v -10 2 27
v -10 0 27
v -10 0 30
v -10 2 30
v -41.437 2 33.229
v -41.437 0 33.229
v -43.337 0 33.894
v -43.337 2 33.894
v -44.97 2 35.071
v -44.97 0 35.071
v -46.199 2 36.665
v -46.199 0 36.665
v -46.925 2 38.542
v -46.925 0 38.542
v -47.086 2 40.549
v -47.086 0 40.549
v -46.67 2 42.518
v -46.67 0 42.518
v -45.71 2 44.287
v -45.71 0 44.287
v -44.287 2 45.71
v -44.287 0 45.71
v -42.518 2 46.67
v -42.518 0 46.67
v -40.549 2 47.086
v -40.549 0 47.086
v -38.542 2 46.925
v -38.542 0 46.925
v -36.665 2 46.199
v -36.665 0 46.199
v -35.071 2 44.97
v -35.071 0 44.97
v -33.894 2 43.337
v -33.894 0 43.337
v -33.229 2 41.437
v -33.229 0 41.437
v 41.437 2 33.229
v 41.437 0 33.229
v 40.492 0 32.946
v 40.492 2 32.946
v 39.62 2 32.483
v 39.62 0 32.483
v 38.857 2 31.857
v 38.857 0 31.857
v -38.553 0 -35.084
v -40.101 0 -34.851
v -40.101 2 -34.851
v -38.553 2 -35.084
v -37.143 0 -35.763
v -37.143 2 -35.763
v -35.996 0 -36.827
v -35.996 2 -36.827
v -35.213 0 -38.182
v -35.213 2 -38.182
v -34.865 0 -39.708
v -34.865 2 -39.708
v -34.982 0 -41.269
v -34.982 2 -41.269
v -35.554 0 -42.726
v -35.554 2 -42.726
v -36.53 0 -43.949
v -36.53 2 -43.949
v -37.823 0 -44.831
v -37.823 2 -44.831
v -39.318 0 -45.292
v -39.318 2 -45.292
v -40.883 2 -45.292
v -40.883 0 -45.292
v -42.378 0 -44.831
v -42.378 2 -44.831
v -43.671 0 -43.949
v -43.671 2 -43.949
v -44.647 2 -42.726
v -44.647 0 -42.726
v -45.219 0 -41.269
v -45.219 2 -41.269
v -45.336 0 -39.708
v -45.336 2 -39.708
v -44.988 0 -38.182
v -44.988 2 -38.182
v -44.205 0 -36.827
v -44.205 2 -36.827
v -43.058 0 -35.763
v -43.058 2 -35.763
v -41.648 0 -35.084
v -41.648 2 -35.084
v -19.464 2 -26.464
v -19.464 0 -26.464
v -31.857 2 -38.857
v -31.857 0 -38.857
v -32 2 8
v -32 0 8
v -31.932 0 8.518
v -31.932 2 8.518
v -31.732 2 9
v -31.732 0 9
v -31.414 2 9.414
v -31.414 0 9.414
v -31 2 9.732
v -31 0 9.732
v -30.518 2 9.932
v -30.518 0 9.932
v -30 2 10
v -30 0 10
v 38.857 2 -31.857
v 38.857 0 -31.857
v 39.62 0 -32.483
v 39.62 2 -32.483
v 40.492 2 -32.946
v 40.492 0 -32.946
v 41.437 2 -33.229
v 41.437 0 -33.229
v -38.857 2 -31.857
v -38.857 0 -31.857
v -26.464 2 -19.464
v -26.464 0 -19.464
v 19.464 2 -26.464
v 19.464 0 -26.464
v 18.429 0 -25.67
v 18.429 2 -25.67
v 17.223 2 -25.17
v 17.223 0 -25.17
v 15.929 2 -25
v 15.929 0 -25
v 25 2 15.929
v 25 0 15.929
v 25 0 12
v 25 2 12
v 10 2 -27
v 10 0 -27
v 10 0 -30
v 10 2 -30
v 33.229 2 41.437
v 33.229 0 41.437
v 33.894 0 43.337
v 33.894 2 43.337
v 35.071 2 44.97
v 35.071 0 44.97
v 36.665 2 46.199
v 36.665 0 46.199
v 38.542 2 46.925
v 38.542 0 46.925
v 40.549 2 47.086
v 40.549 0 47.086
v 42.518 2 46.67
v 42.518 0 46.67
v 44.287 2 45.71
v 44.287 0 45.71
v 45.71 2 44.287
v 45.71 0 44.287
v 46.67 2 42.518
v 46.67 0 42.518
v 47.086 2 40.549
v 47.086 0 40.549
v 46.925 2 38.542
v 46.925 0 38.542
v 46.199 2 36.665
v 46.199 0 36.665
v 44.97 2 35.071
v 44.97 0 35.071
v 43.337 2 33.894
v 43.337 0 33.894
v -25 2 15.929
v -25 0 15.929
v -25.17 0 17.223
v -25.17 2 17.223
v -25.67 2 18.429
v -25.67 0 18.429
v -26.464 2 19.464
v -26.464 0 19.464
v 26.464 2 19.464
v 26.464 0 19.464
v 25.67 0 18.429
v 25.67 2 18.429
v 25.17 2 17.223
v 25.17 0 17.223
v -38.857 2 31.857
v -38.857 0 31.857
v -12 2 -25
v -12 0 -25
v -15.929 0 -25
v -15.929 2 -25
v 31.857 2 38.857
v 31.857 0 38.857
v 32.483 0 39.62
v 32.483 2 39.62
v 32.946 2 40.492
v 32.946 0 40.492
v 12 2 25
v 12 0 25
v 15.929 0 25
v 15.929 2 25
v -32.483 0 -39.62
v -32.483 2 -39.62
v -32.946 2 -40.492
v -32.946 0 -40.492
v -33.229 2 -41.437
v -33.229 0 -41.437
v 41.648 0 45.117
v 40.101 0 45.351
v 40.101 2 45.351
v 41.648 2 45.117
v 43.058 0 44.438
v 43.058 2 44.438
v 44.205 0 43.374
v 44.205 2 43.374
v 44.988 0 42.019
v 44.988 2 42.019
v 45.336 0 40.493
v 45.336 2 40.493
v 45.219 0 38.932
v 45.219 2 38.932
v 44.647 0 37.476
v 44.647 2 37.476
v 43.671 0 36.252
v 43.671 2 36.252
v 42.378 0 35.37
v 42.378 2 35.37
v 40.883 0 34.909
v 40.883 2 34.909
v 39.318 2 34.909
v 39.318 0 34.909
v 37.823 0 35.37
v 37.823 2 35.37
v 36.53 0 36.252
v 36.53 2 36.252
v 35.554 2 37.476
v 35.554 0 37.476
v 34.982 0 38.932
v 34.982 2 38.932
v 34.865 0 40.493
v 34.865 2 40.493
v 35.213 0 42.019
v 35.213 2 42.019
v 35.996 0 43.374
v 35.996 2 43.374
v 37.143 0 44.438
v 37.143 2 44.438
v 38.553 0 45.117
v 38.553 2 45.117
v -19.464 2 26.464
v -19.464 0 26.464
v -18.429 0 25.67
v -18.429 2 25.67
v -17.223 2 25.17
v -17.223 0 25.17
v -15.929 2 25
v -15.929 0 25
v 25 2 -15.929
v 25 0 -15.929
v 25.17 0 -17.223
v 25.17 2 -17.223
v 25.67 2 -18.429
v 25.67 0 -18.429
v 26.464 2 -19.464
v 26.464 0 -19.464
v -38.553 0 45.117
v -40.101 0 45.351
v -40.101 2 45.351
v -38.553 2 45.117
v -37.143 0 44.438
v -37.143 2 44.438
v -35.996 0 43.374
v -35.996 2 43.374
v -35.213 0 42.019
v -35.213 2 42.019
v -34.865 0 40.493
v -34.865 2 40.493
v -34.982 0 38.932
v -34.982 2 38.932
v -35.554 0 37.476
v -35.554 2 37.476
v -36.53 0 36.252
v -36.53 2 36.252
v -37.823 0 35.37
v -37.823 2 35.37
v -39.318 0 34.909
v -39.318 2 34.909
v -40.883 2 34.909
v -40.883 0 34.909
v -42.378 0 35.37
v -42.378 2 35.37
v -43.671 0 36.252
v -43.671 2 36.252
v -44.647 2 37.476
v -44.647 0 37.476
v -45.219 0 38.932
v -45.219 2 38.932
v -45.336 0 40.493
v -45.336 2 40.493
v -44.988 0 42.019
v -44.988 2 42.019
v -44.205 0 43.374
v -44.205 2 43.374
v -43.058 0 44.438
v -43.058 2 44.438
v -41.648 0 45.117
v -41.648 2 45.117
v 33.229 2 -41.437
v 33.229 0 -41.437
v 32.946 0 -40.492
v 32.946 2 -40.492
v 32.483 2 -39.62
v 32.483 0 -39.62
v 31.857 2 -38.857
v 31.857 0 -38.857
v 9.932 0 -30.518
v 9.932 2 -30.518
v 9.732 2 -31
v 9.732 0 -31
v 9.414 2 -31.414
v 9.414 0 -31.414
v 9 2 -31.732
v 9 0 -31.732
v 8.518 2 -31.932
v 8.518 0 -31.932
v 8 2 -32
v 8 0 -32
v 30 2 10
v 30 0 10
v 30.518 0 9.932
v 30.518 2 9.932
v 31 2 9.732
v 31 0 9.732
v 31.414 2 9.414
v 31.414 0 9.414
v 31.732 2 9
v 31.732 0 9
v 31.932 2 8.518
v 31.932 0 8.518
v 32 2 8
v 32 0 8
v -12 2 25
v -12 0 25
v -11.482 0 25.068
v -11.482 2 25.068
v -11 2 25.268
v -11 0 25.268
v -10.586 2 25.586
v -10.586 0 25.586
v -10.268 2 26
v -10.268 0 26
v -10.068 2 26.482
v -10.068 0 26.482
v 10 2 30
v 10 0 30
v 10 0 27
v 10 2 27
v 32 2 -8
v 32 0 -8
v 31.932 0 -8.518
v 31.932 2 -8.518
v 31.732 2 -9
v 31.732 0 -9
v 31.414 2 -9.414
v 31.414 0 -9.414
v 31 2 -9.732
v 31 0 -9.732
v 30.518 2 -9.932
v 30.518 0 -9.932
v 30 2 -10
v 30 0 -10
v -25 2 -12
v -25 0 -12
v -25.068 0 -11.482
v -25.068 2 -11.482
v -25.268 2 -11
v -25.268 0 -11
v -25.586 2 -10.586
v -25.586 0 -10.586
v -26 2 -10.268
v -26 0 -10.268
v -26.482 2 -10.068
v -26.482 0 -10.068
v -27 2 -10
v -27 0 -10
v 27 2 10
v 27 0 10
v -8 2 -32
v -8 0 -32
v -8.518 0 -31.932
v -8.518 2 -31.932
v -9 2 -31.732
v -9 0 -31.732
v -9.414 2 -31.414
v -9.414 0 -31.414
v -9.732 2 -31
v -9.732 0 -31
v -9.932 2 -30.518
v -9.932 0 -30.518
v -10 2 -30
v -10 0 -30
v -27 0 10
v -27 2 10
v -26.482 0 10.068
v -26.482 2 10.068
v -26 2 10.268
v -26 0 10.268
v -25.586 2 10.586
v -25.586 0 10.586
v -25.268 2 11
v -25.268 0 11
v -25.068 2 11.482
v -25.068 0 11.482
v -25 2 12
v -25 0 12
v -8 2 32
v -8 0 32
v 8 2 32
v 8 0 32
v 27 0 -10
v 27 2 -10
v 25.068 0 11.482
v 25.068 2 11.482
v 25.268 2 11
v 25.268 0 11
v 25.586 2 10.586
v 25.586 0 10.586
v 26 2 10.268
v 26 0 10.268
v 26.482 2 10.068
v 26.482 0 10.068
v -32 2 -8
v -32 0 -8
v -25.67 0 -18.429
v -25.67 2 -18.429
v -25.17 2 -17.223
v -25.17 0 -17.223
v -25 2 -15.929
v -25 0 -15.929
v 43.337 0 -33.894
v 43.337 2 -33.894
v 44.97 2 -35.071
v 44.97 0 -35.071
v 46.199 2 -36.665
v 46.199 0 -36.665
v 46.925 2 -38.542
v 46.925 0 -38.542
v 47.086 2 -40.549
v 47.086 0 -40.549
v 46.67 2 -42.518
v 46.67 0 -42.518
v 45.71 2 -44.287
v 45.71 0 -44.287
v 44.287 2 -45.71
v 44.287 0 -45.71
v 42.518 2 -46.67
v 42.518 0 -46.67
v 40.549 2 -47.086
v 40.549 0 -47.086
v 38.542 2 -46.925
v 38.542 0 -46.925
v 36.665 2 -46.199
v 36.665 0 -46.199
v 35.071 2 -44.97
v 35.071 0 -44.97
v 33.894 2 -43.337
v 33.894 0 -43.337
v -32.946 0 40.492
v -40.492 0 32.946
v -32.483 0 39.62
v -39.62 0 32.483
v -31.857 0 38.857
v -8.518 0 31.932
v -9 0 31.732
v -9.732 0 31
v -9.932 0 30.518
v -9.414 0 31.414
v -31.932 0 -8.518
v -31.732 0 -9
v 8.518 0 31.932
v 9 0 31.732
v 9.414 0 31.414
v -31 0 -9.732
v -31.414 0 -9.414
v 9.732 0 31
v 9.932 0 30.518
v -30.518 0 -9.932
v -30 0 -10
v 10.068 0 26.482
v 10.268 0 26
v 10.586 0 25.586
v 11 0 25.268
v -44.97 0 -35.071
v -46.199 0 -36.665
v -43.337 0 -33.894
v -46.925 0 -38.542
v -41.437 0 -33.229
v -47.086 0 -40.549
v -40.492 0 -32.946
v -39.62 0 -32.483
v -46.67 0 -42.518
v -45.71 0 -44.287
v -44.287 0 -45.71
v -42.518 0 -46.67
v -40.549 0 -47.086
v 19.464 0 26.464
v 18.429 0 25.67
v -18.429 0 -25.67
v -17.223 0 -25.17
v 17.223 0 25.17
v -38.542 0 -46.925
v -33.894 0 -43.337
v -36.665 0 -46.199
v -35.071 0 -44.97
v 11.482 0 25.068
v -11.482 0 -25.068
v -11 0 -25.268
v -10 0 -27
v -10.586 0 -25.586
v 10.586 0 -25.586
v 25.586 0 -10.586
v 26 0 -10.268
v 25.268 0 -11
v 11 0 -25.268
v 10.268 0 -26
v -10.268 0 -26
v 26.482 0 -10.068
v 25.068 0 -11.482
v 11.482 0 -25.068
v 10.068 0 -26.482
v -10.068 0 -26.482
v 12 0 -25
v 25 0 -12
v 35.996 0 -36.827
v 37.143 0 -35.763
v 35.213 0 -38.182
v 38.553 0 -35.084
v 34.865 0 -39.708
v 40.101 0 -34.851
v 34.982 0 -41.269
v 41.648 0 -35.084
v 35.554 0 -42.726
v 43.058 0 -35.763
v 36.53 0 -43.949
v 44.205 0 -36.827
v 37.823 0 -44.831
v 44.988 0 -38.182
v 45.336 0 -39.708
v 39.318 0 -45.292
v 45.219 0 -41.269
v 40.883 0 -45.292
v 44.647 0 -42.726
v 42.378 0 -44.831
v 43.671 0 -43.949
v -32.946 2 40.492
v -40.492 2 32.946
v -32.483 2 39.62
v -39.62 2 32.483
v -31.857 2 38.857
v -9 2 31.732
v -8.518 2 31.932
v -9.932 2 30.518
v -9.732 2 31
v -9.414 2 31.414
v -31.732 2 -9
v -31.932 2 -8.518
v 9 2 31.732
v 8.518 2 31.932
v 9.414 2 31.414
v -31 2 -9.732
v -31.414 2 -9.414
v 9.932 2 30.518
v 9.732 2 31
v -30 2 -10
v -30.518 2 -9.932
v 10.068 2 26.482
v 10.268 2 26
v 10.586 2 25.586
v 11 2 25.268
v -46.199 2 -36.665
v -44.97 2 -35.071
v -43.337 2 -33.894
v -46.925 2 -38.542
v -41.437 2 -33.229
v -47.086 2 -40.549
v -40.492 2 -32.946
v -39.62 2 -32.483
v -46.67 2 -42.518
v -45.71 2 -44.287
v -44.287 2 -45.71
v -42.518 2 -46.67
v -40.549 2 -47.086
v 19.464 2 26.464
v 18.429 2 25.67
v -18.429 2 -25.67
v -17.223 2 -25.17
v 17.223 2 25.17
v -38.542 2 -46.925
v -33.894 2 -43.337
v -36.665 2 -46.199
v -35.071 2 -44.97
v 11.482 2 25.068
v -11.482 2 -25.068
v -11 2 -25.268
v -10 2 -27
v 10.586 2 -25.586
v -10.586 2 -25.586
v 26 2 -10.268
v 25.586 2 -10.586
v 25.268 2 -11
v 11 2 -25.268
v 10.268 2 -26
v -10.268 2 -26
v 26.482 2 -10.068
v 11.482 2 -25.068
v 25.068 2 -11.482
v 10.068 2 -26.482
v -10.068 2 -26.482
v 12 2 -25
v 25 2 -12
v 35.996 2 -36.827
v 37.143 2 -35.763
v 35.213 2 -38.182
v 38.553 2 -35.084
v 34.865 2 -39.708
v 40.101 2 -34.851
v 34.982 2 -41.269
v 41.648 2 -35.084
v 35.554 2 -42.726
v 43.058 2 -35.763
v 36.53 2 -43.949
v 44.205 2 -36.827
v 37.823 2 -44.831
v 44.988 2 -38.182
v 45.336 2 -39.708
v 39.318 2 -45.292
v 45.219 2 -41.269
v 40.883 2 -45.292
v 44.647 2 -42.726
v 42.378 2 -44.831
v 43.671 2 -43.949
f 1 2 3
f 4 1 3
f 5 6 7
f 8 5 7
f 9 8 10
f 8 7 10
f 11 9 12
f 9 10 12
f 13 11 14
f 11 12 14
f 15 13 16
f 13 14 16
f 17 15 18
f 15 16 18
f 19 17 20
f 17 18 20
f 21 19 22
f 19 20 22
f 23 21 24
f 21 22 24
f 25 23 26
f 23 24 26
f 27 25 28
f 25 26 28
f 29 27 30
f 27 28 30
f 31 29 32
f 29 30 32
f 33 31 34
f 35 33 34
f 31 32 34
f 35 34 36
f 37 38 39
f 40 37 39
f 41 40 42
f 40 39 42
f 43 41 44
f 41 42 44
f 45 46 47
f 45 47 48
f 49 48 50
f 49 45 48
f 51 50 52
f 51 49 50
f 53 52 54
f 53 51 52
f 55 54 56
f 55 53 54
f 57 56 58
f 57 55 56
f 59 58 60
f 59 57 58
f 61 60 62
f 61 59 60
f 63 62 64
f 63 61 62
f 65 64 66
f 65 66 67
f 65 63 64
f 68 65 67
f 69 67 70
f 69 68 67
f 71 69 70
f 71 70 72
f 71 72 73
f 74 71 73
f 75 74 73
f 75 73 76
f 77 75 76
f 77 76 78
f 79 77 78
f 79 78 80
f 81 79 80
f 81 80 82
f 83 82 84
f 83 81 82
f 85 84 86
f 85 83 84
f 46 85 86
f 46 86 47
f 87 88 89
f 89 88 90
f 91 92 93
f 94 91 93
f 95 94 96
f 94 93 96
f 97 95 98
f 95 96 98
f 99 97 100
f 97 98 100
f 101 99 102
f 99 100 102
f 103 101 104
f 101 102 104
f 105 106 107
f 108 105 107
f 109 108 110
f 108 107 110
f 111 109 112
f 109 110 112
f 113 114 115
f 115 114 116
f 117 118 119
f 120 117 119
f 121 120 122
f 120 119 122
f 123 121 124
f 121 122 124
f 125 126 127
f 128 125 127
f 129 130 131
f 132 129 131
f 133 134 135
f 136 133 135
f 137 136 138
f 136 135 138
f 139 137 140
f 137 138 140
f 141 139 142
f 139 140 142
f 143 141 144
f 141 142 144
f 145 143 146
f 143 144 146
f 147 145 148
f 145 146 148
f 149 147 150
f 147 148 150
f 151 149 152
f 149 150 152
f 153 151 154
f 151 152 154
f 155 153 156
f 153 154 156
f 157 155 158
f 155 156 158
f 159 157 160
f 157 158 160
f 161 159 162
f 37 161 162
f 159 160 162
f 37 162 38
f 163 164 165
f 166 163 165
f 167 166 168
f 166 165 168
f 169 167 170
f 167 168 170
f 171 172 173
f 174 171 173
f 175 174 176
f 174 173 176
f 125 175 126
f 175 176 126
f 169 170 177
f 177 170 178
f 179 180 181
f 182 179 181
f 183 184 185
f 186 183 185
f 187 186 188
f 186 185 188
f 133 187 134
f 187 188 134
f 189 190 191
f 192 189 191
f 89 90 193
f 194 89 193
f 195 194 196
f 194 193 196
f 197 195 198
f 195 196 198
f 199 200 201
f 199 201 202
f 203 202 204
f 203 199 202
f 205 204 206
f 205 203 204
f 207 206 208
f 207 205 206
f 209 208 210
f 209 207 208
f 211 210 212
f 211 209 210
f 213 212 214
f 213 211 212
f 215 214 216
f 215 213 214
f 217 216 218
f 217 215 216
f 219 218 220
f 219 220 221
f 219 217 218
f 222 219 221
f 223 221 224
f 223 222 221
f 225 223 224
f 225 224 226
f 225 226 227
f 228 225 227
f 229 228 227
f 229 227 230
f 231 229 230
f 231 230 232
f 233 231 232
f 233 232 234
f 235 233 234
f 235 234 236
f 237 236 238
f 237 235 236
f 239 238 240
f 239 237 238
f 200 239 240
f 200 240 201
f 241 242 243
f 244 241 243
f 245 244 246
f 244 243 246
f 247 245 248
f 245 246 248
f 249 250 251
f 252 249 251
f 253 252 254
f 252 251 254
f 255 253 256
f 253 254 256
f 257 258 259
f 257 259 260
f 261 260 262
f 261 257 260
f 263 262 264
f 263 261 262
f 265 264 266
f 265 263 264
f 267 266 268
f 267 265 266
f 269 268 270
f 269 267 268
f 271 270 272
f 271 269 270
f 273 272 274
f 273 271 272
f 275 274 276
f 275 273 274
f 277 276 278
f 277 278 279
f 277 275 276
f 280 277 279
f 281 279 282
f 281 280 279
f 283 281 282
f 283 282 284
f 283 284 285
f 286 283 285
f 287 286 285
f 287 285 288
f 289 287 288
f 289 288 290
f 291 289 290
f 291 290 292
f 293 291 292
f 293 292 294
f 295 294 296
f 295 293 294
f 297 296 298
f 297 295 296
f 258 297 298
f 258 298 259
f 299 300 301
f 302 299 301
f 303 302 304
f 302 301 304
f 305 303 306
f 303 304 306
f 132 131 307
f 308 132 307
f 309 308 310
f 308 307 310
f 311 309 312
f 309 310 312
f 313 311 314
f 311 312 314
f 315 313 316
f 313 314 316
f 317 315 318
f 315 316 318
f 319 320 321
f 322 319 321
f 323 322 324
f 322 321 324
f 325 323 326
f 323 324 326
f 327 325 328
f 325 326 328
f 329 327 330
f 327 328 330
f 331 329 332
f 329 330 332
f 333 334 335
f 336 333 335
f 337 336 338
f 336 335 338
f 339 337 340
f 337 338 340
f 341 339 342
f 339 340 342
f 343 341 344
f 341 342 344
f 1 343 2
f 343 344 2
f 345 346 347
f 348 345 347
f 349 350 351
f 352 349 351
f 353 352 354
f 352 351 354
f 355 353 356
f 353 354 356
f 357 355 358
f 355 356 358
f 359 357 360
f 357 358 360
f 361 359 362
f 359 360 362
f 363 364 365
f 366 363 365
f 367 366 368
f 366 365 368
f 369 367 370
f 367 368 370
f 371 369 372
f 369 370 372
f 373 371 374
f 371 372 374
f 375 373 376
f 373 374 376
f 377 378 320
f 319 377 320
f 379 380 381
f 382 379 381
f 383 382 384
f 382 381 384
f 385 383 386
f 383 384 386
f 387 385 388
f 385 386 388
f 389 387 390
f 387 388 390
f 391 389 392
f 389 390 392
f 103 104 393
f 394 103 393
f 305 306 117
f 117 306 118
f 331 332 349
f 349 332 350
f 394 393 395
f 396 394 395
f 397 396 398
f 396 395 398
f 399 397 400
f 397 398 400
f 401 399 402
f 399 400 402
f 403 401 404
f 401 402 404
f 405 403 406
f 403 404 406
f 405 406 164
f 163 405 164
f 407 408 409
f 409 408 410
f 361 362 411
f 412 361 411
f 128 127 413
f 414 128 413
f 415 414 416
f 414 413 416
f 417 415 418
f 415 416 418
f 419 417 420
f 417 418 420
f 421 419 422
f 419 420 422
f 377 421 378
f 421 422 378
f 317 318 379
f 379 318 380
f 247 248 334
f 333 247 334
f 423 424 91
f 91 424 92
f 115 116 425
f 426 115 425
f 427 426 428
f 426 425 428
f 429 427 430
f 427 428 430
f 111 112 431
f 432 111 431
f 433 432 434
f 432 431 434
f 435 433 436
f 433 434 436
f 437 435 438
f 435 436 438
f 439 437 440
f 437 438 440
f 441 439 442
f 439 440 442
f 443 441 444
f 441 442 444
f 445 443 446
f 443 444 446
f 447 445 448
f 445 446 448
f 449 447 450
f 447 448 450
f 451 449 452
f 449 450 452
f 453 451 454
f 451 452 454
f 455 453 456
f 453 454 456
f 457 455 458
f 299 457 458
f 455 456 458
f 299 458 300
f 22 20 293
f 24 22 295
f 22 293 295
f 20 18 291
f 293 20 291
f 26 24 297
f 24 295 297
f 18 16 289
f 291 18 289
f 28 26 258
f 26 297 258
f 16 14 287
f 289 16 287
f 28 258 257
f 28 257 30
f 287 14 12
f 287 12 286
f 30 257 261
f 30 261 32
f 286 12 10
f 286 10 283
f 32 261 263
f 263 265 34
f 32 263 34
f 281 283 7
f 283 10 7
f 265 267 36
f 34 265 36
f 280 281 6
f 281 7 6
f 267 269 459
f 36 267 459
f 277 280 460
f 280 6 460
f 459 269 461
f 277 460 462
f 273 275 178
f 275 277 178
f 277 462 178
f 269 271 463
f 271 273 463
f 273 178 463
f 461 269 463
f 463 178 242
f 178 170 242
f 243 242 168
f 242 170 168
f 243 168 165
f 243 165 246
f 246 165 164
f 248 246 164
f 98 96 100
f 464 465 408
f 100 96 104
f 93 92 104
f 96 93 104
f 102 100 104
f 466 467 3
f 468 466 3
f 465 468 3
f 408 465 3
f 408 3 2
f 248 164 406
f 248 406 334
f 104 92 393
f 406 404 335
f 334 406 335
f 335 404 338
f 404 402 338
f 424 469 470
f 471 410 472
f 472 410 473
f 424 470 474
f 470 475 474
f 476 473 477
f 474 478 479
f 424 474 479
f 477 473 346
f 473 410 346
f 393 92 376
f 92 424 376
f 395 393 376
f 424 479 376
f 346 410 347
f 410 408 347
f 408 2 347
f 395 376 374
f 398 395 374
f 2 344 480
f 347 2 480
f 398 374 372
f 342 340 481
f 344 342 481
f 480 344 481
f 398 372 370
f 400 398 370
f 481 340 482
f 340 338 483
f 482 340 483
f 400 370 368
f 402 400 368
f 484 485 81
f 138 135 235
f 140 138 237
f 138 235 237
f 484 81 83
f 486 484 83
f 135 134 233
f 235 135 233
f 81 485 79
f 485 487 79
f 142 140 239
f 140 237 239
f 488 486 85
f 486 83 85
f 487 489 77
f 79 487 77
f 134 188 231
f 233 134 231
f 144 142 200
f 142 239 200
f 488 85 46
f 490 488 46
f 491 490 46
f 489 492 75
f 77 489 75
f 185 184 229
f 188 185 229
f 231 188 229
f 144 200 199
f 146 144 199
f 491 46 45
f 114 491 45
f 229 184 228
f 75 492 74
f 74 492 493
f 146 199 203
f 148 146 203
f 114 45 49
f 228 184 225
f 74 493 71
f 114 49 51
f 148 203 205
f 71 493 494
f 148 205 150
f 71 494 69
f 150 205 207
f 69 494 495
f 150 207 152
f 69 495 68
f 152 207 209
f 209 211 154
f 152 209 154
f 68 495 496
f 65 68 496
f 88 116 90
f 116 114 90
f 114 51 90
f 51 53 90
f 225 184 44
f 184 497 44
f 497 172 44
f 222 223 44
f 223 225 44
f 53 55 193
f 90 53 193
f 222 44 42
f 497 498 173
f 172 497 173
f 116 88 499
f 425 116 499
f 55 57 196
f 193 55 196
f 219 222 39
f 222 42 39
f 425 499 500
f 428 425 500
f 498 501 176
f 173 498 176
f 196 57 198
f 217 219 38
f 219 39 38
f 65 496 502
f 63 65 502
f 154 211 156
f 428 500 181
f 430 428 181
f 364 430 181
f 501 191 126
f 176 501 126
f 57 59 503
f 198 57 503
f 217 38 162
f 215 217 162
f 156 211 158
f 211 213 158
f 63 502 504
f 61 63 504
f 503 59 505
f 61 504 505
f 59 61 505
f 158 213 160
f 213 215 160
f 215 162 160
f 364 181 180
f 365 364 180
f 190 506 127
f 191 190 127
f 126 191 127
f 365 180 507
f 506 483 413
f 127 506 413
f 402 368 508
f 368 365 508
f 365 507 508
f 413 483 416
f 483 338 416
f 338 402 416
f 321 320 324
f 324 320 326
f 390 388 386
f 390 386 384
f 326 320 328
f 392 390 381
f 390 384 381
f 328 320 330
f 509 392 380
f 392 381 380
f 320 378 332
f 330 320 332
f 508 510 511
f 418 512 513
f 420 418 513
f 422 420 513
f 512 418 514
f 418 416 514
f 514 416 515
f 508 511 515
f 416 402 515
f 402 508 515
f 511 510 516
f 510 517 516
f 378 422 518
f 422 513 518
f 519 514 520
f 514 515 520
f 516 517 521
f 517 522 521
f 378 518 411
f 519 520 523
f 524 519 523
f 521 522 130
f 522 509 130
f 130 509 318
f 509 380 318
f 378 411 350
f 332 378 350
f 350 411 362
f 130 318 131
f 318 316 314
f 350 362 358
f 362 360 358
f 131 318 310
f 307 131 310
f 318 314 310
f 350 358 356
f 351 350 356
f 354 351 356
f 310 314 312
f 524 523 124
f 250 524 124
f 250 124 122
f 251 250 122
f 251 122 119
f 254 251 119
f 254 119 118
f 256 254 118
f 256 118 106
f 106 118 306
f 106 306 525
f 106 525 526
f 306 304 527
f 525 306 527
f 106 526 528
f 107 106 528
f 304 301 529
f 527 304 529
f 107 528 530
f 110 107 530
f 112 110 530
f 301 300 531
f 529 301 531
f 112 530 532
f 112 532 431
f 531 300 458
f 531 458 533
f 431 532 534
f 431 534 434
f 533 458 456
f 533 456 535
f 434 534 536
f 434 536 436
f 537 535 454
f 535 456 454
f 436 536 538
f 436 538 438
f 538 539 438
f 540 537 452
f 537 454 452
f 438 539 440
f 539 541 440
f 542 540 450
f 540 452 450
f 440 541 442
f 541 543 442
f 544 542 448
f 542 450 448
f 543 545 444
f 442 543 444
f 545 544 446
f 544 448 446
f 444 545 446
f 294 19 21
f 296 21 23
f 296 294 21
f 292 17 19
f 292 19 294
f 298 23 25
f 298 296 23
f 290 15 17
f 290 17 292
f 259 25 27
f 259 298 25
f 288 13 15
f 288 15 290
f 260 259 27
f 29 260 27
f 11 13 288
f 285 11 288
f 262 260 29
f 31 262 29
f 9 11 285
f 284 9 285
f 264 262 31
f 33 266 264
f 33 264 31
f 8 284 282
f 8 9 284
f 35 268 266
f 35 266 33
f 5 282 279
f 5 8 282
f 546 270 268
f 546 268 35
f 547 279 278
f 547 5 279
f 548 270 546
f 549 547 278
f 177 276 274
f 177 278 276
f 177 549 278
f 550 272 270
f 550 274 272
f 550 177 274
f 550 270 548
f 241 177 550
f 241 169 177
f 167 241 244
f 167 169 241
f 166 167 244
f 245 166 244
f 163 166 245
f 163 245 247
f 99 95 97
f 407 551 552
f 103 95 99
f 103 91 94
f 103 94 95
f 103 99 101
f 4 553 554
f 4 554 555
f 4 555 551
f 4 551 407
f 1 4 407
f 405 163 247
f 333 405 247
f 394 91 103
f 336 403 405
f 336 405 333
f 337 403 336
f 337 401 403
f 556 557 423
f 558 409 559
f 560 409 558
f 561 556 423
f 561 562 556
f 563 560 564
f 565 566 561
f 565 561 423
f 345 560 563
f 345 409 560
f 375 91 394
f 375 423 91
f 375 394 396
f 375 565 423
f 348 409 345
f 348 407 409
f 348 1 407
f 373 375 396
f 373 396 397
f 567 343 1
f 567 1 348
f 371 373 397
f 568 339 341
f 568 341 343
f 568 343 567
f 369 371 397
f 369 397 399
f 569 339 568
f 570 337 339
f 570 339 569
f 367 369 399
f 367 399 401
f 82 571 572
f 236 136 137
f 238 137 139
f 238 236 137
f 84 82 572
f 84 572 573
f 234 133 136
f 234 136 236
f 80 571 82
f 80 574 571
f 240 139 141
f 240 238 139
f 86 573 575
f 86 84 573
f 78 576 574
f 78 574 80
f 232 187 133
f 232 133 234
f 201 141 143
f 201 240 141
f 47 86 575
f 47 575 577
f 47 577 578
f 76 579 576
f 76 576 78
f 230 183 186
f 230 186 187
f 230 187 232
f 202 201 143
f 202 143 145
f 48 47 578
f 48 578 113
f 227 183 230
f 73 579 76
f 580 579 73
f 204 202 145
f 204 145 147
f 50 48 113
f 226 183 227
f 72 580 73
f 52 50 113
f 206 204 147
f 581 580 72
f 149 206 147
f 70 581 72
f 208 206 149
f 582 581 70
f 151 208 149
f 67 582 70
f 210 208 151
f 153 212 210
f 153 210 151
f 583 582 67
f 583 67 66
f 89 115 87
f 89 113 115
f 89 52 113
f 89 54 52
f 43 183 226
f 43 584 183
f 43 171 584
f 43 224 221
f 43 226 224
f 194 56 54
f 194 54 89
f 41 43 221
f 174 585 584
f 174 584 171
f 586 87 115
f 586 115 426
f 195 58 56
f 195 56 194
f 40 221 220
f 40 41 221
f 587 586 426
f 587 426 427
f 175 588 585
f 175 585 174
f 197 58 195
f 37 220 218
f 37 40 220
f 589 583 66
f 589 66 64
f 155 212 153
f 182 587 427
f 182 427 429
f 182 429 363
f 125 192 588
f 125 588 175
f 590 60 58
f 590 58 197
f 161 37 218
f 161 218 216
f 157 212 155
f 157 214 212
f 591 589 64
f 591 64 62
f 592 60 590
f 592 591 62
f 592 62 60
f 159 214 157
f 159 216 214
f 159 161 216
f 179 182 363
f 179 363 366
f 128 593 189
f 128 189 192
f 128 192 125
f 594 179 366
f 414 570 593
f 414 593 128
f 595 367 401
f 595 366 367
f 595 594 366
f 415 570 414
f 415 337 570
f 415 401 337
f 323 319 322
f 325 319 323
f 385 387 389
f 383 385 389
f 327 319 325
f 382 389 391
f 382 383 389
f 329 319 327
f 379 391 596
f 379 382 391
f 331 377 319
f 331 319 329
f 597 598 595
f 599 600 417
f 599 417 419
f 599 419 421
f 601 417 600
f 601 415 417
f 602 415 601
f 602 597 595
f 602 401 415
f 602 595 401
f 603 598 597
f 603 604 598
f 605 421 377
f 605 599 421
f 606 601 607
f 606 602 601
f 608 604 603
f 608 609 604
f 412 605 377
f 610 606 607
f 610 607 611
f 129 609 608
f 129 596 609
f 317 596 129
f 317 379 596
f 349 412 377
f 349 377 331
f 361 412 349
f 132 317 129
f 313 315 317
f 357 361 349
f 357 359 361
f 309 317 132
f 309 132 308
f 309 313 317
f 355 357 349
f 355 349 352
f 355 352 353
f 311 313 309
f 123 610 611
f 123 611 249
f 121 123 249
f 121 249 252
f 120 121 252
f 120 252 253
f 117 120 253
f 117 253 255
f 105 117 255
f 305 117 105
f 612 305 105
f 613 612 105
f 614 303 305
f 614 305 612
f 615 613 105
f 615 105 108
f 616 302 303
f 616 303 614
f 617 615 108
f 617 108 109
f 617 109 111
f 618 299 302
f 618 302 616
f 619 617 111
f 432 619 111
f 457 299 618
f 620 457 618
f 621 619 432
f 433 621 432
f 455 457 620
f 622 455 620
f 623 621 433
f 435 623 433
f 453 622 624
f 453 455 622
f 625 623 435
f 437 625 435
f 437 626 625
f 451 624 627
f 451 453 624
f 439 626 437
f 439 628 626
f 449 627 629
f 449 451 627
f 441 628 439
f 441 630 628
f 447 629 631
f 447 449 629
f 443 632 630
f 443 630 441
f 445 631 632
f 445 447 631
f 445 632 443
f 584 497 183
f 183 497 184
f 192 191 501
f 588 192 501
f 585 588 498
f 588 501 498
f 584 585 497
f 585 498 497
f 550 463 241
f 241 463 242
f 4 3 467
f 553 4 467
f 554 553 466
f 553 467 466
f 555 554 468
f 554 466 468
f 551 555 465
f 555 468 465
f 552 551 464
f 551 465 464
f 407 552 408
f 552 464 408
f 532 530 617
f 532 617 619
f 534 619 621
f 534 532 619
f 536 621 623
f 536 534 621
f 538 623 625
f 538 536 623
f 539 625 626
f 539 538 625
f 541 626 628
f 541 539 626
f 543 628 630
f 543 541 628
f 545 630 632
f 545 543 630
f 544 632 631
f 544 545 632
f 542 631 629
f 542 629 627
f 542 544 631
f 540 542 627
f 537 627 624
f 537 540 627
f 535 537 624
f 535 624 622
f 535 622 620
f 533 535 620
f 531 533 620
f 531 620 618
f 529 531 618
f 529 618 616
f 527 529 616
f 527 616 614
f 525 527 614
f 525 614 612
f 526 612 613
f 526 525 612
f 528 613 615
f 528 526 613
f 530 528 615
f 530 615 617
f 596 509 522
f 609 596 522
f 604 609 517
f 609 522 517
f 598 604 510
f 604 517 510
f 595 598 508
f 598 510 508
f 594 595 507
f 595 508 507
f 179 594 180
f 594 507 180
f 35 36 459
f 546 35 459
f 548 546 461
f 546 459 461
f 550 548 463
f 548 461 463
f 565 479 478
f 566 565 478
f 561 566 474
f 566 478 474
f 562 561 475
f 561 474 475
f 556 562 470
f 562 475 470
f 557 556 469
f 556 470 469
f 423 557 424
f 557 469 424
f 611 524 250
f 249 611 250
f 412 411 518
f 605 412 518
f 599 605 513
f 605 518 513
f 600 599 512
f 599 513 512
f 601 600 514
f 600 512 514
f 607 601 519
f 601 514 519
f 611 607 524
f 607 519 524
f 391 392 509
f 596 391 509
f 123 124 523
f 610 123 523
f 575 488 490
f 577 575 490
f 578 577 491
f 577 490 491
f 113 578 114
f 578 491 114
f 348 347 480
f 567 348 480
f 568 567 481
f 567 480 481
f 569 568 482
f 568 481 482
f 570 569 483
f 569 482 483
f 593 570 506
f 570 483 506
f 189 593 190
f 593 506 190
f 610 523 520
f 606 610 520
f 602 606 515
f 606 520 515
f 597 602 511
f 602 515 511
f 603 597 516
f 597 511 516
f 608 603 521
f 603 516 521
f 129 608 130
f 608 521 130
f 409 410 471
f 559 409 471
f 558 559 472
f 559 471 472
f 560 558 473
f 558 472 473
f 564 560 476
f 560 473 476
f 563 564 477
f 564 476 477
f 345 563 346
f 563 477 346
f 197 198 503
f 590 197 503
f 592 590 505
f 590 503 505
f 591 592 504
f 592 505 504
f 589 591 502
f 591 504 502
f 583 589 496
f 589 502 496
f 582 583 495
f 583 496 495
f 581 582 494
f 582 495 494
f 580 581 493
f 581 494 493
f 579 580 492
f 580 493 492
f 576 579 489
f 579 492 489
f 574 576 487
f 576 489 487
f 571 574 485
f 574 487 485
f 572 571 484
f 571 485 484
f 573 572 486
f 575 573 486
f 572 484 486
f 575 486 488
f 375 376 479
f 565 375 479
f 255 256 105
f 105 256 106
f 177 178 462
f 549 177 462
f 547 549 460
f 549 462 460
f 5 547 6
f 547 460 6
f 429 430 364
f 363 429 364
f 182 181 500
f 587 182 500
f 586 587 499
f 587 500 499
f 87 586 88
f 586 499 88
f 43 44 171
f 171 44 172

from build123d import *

# Parameters (mm, degrees)
SKETCH_1_R      = 5.25
EXTRUDE_1_DEPTH = 2


with BuildPart() as part:
    # 草图1 → 凸台-拉伸1 (new body)
    with BuildSketch(Plane(origin=(0, 0, 0), x_dir=(1, 0, 0), z_dir=(0, 1, 0))):
        with BuildLine():
            Line((-15.928932188, -25), (-12, -25))
            ThreePointArc((-12, -25), (-10.585786438, -25.585786438), (-10, -27))
            Line((-10, -27), (-10, -30))
            ThreePointArc((-10, -30), (-9.414213562, -31.414213562), (-8, -32))
            Line((-8, -32), (8, -32))
            ThreePointArc((8, -32), (9.414213562, -31.414213562), (10, -30))
            Line((10, -30), (10, -27))
            ThreePointArc((10, -27), (10.585786438, -25.585786438), (12, -25))
            Line((12, -25), (15.928932188, -25))
            ThreePointArc((15.928932188, -25), (17.84234935, -25.380602337), (19.464466094, -26.464466094))
            Line((19.464466094, -26.464466094), (31.856955479, -38.856955479))
            ThreePointArc((31.856955479, -38.856955479), (32.735932701, -40.044705003), (33.229373027, -41.437495918))
            ThreePointArc((33.229373027, -41.437495918), (45.050252532, -45.050252532), (41.437495918, -33.229373027))
            ThreePointArc((41.437495918, -33.229373027), (40.044705003, -32.735932701), (38.856955479, -31.856955479))
            Line((38.856955479, -31.856955479), (26.464466094, -19.464466094))
            ThreePointArc((26.464466094, -19.464466094), (25.380602337, -17.84234935), (25, -15.928932188))
            Line((25, -15.928932188), (25, -12))
            ThreePointArc((25, -12), (25.585786438, -10.585786438), (27, -10))
            Line((27, -10), (30, -10))
            ThreePointArc((30, -10), (31.414213562, -9.414213562), (32, -8))
            Line((32, -8), (32, 8))
            ThreePointArc((32, 8), (31.414213562, 9.414213562), (30, 10))
            Line((30, 10), (27, 10))
            ThreePointArc((27, 10), (25.585786438, 10.585786438), (25, 12))
            Line((25, 12), (25, 15.928932188))
            ThreePointArc((25, 15.928932188), (25.380602337, 17.84234935), (26.464466094, 19.464466094))
            Line((26.464466094, 19.464466094), (38.856955479, 31.856955479))
            ThreePointArc((38.856955479, 31.856955479), (40.044705003, 32.735932701), (41.437495918, 33.229373027))
            ThreePointArc((41.437495918, 33.229373027), (45.050252532, 45.050252532), (33.229373027, 41.437495918))
            ThreePointArc((33.229373027, 41.437495918), (32.735932701, 40.044705003), (31.856955479, 38.856955479))
            Line((31.856955479, 38.856955479), (19.464466094, 26.464466094))
            ThreePointArc((19.464466094, 26.464466094), (17.84234935, 25.380602337), (15.928932188, 25))
            Line((15.928932188, 25), (12, 25))
            ThreePointArc((12, 25), (10.585786438, 25.585786438), (10, 27))
            Line((10, 27), (10, 30))
            ThreePointArc((10, 30), (9.414213562, 31.414213562), (8, 32))
            Line((8, 32), (-8, 32))
            ThreePointArc((-8, 32), (-9.414213562, 31.414213562), (-10, 30))
            Line((-10, 30), (-10, 27))
            ThreePointArc((-10, 27), (-10.585786438, 25.585786438), (-12, 25))
            Line((-12, 25), (-15.928932188, 25))
            ThreePointArc((-15.928932188, 25), (-17.84234935, 25.380602337), (-19.464466094, 26.464466094))
            Line((-19.464466094, 26.464466094), (-31.856955479, 38.856955479))
            ThreePointArc((-31.856955479, 38.856955479), (-32.735932701, 40.044705003), (-33.229373027, 41.437495918))
            ThreePointArc((-33.229373027, 41.437495918), (-45.050252532, 45.050252532), (-41.437495918, 33.229373027))
            ThreePointArc((-41.437495918, 33.229373027), (-40.044705003, 32.735932701), (-38.856955479, 31.856955479))
            Line((-38.856955479, 31.856955479), (-26.464466094, 19.464466094))
            ThreePointArc((-26.464466094, 19.464466094), (-25.380602337, 17.84234935), (-25, 15.928932188))
            Line((-25, 15.928932188), (-25, 12))
            ThreePointArc((-25, 12), (-25.585786438, 10.585786438), (-27, 10))
            Line((-27, 10), (-30, 10))
            ThreePointArc((-30, 10), (-31.414213562, 9.414213562), (-32, 8))
            Line((-32, 8), (-32, -8))
            ThreePointArc((-32, -8), (-31.414213562, -9.414213562), (-30, -10))
            Line((-30, -10), (-27, -10))
            ThreePointArc((-27, -10), (-25.585786438, -10.585786438), (-25, -12))
            Line((-25, -12), (-25, -15.928932188))
            ThreePointArc((-25, -15.928932188), (-25.380602337, -17.84234935), (-26.464466094, -19.464466094))
            Line((-26.464466094, -19.464466094), (-38.856955479, -31.856955479))
            ThreePointArc((-38.856955479, -31.856955479), (-40.044705003, -32.735932701), (-41.437495918, -33.229373027))
            ThreePointArc((-41.437495918, -33.229373027), (-45.050252532, -45.050252532), (-33.229373027, -41.437495918))
            ThreePointArc((-33.229373027, -41.437495918), (-32.735932701, -40.044705003), (-31.856955479, -38.856955479))
            Line((-31.856955479, -38.856955479), (-19.464466094, -26.464466094))
            ThreePointArc((-19.464466094, -26.464466094), (-17.84234935, -25.380602337), (-15.928932188, -25))
        make_face()
        with Locations(Location((-40.100505063, 40.100505063, 0), (0, 0, 270))):
            Circle(SKETCH_1_R, mode=Mode.SUBTRACT)
        with Locations(Location((40.100505063, 40.100505063, 0), (0, 0, 270))):
            Circle(SKETCH_1_R, mode=Mode.SUBTRACT)
        with Locations(Location((40.100505063, -40.100505063, 0), (0, 0, 270))):
            Circle(SKETCH_1_R, mode=Mode.SUBTRACT)
        with Locations(Location((-40.100505063, -40.100505063, 0), (0, 0, 270))):
            Circle(SKETCH_1_R, mode=Mode.SUBTRACT)
    extrude(amount=EXTRUDE_1_DEPTH)


solid = part.part
